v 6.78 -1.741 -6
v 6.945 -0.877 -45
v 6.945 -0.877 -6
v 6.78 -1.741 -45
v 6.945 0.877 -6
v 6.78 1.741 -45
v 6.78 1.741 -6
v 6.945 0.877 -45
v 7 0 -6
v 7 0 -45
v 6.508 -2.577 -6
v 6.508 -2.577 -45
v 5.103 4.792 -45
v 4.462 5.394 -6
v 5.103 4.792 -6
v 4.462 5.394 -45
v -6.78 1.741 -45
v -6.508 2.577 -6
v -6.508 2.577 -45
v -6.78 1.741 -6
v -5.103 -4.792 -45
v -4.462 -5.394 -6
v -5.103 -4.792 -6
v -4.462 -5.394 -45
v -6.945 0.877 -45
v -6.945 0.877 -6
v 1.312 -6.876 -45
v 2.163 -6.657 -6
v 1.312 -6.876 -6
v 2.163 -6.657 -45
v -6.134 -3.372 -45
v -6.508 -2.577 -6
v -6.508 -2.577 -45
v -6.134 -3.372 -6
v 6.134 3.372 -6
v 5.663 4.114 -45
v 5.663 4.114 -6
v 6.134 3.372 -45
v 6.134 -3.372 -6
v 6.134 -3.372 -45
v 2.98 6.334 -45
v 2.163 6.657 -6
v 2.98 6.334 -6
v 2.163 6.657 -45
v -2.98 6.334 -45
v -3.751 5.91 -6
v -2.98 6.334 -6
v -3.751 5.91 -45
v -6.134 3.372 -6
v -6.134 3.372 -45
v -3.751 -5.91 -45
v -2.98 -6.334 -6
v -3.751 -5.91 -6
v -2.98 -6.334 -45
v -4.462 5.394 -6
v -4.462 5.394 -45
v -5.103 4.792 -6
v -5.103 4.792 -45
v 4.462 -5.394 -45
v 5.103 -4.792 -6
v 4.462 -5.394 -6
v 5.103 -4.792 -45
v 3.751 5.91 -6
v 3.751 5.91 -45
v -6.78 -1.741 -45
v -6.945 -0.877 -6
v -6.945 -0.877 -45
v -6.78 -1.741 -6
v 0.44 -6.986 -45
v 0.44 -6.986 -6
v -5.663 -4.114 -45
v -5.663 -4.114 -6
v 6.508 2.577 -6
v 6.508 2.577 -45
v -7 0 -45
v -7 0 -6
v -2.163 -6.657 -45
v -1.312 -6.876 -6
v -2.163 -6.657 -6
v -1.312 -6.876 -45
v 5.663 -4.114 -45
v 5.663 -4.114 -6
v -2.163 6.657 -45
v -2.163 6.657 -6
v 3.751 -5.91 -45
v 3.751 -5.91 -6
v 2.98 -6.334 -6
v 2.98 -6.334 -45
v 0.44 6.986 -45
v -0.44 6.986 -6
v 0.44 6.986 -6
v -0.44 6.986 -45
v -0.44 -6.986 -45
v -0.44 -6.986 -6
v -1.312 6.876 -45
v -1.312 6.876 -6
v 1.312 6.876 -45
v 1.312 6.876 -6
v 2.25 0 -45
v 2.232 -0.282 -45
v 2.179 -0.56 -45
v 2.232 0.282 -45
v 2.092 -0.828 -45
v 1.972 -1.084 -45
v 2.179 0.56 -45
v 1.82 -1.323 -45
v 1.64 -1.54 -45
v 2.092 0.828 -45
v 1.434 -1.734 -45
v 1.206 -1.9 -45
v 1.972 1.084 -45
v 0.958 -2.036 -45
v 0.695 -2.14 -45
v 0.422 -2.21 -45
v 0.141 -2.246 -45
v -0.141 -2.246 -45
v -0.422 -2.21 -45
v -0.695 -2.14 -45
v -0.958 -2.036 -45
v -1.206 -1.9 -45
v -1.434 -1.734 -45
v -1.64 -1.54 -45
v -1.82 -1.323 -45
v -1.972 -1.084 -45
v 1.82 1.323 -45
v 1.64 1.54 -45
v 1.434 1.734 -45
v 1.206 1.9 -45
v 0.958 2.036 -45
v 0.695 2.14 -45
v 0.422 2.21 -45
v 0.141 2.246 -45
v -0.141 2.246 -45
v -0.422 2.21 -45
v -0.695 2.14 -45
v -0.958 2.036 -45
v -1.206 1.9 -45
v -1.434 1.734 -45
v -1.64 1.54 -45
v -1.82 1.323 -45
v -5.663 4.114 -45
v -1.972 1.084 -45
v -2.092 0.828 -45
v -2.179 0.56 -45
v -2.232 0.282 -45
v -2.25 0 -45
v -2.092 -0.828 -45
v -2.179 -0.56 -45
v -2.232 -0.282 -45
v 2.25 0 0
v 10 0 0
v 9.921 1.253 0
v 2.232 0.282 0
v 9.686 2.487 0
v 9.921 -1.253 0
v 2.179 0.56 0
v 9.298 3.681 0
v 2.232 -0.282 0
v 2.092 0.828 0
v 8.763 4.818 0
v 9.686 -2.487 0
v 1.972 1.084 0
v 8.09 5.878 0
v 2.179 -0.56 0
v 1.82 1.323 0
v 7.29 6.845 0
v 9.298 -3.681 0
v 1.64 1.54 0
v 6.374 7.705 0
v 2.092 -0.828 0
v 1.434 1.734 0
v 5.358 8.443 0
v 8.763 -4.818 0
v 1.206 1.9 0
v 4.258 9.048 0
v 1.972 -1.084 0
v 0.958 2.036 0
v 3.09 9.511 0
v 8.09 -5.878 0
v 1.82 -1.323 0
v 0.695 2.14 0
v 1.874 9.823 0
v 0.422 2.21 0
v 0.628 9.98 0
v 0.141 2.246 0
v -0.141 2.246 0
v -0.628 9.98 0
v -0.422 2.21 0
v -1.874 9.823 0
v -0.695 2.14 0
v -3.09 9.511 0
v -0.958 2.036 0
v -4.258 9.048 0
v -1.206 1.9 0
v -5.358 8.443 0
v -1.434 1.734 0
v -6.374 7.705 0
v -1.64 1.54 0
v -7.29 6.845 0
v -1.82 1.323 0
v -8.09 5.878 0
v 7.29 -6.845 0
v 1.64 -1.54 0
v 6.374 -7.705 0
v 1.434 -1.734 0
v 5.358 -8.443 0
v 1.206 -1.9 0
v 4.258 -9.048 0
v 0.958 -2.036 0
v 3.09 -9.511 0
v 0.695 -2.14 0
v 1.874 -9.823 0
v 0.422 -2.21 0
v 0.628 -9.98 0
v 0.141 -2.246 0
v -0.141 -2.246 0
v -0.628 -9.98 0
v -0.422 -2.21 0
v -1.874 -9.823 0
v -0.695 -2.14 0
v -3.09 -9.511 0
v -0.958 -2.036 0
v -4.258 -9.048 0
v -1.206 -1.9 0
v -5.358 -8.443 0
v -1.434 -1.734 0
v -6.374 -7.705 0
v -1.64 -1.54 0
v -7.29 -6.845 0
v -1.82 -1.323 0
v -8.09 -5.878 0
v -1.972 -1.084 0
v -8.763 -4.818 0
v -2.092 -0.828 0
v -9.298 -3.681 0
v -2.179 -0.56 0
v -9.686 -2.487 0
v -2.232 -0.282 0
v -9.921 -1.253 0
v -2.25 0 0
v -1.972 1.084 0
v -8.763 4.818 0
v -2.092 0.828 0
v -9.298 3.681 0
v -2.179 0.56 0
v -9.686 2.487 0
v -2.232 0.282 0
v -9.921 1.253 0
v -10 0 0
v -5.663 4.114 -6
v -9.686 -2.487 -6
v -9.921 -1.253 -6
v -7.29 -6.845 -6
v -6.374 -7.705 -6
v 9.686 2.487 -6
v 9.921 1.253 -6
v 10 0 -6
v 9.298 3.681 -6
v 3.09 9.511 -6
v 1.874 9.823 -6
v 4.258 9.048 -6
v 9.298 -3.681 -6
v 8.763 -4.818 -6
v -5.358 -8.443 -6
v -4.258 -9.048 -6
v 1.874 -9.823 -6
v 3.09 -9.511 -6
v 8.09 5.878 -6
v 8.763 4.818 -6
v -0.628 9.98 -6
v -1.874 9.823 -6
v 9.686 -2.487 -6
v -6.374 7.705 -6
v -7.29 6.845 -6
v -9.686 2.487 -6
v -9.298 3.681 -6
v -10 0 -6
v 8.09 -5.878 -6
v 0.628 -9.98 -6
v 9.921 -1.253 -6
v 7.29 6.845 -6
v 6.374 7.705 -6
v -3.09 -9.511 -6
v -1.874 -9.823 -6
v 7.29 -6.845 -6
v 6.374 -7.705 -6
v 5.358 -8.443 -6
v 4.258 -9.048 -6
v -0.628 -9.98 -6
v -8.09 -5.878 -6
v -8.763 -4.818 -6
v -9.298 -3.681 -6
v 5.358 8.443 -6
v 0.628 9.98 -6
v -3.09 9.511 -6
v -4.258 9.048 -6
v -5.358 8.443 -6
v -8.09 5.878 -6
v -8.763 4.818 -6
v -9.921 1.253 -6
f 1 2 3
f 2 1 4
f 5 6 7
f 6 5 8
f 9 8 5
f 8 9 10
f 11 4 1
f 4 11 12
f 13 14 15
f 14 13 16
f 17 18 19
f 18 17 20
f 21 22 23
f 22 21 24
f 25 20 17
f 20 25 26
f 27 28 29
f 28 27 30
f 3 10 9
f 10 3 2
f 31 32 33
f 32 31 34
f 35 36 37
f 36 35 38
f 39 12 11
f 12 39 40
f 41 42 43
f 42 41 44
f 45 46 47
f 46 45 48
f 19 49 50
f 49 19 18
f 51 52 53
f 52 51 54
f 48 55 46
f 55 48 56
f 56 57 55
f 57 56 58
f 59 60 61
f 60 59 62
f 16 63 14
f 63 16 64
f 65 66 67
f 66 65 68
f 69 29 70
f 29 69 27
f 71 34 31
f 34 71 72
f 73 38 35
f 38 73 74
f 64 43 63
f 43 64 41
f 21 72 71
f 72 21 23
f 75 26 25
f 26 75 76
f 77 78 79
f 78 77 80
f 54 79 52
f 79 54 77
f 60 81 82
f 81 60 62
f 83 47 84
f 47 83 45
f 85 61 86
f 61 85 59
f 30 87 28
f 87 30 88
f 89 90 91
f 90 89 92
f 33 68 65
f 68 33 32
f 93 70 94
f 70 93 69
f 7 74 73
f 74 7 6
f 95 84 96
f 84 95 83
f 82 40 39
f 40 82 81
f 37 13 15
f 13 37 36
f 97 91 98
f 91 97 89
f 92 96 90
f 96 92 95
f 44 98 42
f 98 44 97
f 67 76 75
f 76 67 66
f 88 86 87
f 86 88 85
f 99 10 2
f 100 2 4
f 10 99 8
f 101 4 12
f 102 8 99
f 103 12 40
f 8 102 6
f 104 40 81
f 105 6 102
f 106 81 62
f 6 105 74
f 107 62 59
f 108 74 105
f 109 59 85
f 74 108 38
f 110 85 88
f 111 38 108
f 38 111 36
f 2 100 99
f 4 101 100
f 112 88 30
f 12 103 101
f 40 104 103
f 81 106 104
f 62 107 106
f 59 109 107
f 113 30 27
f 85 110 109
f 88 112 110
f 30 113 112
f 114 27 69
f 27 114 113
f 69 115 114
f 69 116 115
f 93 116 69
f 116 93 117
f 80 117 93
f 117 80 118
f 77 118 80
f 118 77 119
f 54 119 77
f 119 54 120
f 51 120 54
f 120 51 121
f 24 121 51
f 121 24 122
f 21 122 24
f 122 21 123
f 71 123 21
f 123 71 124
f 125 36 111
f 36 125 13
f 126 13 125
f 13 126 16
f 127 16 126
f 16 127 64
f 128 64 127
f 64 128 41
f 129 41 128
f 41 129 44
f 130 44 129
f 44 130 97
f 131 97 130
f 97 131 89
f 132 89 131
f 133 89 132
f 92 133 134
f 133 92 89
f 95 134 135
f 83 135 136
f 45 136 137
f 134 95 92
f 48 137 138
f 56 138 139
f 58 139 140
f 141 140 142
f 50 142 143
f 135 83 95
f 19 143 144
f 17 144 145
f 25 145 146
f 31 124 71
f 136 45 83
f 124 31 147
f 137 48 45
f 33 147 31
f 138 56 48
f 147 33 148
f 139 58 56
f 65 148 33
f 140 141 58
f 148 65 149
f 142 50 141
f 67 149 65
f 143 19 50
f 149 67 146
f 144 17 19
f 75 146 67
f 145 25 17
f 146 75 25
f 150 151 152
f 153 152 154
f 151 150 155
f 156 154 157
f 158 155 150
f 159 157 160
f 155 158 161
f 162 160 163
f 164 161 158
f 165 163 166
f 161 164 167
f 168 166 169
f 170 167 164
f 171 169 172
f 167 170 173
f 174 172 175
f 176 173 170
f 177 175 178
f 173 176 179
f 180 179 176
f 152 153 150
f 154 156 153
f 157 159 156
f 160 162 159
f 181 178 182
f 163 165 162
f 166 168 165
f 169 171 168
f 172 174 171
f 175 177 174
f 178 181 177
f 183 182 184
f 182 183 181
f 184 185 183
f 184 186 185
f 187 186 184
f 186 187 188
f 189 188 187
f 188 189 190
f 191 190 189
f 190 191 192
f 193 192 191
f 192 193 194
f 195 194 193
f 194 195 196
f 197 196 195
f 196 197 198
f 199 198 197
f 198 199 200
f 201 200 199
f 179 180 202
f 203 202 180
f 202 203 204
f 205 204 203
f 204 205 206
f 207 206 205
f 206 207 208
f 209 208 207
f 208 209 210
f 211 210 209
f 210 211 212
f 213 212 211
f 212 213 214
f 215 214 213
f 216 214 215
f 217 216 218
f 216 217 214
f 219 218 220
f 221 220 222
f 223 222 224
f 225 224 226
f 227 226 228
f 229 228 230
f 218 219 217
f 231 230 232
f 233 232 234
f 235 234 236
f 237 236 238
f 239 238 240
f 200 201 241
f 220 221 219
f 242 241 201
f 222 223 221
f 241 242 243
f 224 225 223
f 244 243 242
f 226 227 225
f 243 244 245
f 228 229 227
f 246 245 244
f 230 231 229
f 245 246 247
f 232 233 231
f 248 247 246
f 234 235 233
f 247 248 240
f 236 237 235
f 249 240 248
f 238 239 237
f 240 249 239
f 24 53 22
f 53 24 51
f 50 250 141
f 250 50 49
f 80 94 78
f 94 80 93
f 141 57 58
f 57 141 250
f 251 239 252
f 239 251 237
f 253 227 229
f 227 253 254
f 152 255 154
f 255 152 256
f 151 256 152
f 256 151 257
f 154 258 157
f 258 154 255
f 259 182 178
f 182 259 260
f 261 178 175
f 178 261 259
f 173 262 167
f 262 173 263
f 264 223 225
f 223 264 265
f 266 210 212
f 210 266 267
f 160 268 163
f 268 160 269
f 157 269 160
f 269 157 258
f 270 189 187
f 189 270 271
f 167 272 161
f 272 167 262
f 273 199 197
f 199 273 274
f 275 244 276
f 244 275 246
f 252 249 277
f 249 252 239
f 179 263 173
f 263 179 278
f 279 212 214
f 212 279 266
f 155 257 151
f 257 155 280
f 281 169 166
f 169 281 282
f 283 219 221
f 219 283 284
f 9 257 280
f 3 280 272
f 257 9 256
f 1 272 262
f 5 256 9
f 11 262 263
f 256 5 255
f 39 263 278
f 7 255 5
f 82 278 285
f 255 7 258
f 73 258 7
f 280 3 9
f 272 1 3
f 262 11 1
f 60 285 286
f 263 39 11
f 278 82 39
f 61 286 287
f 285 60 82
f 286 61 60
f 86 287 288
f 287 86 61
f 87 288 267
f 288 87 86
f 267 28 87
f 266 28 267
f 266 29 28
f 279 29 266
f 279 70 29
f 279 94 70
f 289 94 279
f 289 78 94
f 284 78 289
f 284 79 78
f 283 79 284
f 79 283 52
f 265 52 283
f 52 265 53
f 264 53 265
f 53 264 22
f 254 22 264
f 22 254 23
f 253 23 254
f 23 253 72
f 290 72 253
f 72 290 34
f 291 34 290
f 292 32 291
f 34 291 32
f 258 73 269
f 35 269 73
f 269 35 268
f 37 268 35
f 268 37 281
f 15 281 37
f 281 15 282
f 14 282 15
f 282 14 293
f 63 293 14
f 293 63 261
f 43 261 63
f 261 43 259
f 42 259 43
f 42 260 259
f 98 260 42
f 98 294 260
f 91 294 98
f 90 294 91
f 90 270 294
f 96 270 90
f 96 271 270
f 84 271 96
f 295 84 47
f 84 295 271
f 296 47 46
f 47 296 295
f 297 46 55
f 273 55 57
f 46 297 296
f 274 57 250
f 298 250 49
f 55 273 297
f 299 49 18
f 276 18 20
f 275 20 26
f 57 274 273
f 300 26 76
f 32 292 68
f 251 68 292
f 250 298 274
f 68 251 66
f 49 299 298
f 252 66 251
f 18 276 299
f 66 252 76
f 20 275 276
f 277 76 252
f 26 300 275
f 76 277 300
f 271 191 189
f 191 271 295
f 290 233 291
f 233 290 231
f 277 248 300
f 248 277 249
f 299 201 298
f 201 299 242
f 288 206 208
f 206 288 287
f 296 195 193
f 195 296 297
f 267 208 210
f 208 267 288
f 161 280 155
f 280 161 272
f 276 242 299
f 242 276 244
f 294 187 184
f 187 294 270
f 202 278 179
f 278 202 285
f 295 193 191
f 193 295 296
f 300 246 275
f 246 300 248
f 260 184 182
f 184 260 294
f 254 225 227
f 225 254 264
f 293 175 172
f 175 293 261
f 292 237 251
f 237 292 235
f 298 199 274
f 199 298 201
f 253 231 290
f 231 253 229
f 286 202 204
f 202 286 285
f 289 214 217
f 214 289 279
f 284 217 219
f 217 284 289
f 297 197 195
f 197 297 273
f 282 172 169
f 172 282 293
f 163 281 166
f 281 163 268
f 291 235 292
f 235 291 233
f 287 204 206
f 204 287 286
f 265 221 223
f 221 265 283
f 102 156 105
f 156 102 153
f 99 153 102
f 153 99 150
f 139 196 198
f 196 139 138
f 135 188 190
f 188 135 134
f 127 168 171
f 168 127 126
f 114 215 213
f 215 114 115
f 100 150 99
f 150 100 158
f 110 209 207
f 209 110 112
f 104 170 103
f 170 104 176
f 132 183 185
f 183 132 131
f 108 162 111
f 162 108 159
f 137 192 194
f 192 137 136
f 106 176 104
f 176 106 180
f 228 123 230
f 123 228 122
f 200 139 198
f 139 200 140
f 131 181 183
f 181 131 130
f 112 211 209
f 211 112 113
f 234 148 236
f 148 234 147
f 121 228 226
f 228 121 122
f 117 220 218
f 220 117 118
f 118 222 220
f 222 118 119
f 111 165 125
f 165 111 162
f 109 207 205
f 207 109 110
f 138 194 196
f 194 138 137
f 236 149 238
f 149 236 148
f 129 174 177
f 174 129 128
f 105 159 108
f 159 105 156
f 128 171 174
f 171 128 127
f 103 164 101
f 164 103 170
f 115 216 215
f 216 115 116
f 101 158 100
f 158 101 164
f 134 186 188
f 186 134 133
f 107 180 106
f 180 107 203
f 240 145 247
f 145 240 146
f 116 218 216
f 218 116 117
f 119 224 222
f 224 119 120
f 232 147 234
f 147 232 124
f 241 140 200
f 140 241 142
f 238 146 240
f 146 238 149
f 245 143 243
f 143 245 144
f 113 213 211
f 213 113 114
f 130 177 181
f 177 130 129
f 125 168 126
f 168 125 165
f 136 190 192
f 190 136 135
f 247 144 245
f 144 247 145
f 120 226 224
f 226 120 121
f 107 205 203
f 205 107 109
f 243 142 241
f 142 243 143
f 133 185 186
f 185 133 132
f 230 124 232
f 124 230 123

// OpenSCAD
$fn = 50;


difference() {
	union() {
		translate(v = [0, 0, -45.0000000000]) {
			cylinder(h = 45, r = 7.0000000000);
		}
		translate(v = [0, 0, -6.0000000000]) {
			cylinder(h = 6, r = 10.0000000000);
		}
	}
	union() {
		#translate(v = [0, 0, -45]) {
			cylinder(h = 45, r = 2.2500000000);
		}
	}
}
